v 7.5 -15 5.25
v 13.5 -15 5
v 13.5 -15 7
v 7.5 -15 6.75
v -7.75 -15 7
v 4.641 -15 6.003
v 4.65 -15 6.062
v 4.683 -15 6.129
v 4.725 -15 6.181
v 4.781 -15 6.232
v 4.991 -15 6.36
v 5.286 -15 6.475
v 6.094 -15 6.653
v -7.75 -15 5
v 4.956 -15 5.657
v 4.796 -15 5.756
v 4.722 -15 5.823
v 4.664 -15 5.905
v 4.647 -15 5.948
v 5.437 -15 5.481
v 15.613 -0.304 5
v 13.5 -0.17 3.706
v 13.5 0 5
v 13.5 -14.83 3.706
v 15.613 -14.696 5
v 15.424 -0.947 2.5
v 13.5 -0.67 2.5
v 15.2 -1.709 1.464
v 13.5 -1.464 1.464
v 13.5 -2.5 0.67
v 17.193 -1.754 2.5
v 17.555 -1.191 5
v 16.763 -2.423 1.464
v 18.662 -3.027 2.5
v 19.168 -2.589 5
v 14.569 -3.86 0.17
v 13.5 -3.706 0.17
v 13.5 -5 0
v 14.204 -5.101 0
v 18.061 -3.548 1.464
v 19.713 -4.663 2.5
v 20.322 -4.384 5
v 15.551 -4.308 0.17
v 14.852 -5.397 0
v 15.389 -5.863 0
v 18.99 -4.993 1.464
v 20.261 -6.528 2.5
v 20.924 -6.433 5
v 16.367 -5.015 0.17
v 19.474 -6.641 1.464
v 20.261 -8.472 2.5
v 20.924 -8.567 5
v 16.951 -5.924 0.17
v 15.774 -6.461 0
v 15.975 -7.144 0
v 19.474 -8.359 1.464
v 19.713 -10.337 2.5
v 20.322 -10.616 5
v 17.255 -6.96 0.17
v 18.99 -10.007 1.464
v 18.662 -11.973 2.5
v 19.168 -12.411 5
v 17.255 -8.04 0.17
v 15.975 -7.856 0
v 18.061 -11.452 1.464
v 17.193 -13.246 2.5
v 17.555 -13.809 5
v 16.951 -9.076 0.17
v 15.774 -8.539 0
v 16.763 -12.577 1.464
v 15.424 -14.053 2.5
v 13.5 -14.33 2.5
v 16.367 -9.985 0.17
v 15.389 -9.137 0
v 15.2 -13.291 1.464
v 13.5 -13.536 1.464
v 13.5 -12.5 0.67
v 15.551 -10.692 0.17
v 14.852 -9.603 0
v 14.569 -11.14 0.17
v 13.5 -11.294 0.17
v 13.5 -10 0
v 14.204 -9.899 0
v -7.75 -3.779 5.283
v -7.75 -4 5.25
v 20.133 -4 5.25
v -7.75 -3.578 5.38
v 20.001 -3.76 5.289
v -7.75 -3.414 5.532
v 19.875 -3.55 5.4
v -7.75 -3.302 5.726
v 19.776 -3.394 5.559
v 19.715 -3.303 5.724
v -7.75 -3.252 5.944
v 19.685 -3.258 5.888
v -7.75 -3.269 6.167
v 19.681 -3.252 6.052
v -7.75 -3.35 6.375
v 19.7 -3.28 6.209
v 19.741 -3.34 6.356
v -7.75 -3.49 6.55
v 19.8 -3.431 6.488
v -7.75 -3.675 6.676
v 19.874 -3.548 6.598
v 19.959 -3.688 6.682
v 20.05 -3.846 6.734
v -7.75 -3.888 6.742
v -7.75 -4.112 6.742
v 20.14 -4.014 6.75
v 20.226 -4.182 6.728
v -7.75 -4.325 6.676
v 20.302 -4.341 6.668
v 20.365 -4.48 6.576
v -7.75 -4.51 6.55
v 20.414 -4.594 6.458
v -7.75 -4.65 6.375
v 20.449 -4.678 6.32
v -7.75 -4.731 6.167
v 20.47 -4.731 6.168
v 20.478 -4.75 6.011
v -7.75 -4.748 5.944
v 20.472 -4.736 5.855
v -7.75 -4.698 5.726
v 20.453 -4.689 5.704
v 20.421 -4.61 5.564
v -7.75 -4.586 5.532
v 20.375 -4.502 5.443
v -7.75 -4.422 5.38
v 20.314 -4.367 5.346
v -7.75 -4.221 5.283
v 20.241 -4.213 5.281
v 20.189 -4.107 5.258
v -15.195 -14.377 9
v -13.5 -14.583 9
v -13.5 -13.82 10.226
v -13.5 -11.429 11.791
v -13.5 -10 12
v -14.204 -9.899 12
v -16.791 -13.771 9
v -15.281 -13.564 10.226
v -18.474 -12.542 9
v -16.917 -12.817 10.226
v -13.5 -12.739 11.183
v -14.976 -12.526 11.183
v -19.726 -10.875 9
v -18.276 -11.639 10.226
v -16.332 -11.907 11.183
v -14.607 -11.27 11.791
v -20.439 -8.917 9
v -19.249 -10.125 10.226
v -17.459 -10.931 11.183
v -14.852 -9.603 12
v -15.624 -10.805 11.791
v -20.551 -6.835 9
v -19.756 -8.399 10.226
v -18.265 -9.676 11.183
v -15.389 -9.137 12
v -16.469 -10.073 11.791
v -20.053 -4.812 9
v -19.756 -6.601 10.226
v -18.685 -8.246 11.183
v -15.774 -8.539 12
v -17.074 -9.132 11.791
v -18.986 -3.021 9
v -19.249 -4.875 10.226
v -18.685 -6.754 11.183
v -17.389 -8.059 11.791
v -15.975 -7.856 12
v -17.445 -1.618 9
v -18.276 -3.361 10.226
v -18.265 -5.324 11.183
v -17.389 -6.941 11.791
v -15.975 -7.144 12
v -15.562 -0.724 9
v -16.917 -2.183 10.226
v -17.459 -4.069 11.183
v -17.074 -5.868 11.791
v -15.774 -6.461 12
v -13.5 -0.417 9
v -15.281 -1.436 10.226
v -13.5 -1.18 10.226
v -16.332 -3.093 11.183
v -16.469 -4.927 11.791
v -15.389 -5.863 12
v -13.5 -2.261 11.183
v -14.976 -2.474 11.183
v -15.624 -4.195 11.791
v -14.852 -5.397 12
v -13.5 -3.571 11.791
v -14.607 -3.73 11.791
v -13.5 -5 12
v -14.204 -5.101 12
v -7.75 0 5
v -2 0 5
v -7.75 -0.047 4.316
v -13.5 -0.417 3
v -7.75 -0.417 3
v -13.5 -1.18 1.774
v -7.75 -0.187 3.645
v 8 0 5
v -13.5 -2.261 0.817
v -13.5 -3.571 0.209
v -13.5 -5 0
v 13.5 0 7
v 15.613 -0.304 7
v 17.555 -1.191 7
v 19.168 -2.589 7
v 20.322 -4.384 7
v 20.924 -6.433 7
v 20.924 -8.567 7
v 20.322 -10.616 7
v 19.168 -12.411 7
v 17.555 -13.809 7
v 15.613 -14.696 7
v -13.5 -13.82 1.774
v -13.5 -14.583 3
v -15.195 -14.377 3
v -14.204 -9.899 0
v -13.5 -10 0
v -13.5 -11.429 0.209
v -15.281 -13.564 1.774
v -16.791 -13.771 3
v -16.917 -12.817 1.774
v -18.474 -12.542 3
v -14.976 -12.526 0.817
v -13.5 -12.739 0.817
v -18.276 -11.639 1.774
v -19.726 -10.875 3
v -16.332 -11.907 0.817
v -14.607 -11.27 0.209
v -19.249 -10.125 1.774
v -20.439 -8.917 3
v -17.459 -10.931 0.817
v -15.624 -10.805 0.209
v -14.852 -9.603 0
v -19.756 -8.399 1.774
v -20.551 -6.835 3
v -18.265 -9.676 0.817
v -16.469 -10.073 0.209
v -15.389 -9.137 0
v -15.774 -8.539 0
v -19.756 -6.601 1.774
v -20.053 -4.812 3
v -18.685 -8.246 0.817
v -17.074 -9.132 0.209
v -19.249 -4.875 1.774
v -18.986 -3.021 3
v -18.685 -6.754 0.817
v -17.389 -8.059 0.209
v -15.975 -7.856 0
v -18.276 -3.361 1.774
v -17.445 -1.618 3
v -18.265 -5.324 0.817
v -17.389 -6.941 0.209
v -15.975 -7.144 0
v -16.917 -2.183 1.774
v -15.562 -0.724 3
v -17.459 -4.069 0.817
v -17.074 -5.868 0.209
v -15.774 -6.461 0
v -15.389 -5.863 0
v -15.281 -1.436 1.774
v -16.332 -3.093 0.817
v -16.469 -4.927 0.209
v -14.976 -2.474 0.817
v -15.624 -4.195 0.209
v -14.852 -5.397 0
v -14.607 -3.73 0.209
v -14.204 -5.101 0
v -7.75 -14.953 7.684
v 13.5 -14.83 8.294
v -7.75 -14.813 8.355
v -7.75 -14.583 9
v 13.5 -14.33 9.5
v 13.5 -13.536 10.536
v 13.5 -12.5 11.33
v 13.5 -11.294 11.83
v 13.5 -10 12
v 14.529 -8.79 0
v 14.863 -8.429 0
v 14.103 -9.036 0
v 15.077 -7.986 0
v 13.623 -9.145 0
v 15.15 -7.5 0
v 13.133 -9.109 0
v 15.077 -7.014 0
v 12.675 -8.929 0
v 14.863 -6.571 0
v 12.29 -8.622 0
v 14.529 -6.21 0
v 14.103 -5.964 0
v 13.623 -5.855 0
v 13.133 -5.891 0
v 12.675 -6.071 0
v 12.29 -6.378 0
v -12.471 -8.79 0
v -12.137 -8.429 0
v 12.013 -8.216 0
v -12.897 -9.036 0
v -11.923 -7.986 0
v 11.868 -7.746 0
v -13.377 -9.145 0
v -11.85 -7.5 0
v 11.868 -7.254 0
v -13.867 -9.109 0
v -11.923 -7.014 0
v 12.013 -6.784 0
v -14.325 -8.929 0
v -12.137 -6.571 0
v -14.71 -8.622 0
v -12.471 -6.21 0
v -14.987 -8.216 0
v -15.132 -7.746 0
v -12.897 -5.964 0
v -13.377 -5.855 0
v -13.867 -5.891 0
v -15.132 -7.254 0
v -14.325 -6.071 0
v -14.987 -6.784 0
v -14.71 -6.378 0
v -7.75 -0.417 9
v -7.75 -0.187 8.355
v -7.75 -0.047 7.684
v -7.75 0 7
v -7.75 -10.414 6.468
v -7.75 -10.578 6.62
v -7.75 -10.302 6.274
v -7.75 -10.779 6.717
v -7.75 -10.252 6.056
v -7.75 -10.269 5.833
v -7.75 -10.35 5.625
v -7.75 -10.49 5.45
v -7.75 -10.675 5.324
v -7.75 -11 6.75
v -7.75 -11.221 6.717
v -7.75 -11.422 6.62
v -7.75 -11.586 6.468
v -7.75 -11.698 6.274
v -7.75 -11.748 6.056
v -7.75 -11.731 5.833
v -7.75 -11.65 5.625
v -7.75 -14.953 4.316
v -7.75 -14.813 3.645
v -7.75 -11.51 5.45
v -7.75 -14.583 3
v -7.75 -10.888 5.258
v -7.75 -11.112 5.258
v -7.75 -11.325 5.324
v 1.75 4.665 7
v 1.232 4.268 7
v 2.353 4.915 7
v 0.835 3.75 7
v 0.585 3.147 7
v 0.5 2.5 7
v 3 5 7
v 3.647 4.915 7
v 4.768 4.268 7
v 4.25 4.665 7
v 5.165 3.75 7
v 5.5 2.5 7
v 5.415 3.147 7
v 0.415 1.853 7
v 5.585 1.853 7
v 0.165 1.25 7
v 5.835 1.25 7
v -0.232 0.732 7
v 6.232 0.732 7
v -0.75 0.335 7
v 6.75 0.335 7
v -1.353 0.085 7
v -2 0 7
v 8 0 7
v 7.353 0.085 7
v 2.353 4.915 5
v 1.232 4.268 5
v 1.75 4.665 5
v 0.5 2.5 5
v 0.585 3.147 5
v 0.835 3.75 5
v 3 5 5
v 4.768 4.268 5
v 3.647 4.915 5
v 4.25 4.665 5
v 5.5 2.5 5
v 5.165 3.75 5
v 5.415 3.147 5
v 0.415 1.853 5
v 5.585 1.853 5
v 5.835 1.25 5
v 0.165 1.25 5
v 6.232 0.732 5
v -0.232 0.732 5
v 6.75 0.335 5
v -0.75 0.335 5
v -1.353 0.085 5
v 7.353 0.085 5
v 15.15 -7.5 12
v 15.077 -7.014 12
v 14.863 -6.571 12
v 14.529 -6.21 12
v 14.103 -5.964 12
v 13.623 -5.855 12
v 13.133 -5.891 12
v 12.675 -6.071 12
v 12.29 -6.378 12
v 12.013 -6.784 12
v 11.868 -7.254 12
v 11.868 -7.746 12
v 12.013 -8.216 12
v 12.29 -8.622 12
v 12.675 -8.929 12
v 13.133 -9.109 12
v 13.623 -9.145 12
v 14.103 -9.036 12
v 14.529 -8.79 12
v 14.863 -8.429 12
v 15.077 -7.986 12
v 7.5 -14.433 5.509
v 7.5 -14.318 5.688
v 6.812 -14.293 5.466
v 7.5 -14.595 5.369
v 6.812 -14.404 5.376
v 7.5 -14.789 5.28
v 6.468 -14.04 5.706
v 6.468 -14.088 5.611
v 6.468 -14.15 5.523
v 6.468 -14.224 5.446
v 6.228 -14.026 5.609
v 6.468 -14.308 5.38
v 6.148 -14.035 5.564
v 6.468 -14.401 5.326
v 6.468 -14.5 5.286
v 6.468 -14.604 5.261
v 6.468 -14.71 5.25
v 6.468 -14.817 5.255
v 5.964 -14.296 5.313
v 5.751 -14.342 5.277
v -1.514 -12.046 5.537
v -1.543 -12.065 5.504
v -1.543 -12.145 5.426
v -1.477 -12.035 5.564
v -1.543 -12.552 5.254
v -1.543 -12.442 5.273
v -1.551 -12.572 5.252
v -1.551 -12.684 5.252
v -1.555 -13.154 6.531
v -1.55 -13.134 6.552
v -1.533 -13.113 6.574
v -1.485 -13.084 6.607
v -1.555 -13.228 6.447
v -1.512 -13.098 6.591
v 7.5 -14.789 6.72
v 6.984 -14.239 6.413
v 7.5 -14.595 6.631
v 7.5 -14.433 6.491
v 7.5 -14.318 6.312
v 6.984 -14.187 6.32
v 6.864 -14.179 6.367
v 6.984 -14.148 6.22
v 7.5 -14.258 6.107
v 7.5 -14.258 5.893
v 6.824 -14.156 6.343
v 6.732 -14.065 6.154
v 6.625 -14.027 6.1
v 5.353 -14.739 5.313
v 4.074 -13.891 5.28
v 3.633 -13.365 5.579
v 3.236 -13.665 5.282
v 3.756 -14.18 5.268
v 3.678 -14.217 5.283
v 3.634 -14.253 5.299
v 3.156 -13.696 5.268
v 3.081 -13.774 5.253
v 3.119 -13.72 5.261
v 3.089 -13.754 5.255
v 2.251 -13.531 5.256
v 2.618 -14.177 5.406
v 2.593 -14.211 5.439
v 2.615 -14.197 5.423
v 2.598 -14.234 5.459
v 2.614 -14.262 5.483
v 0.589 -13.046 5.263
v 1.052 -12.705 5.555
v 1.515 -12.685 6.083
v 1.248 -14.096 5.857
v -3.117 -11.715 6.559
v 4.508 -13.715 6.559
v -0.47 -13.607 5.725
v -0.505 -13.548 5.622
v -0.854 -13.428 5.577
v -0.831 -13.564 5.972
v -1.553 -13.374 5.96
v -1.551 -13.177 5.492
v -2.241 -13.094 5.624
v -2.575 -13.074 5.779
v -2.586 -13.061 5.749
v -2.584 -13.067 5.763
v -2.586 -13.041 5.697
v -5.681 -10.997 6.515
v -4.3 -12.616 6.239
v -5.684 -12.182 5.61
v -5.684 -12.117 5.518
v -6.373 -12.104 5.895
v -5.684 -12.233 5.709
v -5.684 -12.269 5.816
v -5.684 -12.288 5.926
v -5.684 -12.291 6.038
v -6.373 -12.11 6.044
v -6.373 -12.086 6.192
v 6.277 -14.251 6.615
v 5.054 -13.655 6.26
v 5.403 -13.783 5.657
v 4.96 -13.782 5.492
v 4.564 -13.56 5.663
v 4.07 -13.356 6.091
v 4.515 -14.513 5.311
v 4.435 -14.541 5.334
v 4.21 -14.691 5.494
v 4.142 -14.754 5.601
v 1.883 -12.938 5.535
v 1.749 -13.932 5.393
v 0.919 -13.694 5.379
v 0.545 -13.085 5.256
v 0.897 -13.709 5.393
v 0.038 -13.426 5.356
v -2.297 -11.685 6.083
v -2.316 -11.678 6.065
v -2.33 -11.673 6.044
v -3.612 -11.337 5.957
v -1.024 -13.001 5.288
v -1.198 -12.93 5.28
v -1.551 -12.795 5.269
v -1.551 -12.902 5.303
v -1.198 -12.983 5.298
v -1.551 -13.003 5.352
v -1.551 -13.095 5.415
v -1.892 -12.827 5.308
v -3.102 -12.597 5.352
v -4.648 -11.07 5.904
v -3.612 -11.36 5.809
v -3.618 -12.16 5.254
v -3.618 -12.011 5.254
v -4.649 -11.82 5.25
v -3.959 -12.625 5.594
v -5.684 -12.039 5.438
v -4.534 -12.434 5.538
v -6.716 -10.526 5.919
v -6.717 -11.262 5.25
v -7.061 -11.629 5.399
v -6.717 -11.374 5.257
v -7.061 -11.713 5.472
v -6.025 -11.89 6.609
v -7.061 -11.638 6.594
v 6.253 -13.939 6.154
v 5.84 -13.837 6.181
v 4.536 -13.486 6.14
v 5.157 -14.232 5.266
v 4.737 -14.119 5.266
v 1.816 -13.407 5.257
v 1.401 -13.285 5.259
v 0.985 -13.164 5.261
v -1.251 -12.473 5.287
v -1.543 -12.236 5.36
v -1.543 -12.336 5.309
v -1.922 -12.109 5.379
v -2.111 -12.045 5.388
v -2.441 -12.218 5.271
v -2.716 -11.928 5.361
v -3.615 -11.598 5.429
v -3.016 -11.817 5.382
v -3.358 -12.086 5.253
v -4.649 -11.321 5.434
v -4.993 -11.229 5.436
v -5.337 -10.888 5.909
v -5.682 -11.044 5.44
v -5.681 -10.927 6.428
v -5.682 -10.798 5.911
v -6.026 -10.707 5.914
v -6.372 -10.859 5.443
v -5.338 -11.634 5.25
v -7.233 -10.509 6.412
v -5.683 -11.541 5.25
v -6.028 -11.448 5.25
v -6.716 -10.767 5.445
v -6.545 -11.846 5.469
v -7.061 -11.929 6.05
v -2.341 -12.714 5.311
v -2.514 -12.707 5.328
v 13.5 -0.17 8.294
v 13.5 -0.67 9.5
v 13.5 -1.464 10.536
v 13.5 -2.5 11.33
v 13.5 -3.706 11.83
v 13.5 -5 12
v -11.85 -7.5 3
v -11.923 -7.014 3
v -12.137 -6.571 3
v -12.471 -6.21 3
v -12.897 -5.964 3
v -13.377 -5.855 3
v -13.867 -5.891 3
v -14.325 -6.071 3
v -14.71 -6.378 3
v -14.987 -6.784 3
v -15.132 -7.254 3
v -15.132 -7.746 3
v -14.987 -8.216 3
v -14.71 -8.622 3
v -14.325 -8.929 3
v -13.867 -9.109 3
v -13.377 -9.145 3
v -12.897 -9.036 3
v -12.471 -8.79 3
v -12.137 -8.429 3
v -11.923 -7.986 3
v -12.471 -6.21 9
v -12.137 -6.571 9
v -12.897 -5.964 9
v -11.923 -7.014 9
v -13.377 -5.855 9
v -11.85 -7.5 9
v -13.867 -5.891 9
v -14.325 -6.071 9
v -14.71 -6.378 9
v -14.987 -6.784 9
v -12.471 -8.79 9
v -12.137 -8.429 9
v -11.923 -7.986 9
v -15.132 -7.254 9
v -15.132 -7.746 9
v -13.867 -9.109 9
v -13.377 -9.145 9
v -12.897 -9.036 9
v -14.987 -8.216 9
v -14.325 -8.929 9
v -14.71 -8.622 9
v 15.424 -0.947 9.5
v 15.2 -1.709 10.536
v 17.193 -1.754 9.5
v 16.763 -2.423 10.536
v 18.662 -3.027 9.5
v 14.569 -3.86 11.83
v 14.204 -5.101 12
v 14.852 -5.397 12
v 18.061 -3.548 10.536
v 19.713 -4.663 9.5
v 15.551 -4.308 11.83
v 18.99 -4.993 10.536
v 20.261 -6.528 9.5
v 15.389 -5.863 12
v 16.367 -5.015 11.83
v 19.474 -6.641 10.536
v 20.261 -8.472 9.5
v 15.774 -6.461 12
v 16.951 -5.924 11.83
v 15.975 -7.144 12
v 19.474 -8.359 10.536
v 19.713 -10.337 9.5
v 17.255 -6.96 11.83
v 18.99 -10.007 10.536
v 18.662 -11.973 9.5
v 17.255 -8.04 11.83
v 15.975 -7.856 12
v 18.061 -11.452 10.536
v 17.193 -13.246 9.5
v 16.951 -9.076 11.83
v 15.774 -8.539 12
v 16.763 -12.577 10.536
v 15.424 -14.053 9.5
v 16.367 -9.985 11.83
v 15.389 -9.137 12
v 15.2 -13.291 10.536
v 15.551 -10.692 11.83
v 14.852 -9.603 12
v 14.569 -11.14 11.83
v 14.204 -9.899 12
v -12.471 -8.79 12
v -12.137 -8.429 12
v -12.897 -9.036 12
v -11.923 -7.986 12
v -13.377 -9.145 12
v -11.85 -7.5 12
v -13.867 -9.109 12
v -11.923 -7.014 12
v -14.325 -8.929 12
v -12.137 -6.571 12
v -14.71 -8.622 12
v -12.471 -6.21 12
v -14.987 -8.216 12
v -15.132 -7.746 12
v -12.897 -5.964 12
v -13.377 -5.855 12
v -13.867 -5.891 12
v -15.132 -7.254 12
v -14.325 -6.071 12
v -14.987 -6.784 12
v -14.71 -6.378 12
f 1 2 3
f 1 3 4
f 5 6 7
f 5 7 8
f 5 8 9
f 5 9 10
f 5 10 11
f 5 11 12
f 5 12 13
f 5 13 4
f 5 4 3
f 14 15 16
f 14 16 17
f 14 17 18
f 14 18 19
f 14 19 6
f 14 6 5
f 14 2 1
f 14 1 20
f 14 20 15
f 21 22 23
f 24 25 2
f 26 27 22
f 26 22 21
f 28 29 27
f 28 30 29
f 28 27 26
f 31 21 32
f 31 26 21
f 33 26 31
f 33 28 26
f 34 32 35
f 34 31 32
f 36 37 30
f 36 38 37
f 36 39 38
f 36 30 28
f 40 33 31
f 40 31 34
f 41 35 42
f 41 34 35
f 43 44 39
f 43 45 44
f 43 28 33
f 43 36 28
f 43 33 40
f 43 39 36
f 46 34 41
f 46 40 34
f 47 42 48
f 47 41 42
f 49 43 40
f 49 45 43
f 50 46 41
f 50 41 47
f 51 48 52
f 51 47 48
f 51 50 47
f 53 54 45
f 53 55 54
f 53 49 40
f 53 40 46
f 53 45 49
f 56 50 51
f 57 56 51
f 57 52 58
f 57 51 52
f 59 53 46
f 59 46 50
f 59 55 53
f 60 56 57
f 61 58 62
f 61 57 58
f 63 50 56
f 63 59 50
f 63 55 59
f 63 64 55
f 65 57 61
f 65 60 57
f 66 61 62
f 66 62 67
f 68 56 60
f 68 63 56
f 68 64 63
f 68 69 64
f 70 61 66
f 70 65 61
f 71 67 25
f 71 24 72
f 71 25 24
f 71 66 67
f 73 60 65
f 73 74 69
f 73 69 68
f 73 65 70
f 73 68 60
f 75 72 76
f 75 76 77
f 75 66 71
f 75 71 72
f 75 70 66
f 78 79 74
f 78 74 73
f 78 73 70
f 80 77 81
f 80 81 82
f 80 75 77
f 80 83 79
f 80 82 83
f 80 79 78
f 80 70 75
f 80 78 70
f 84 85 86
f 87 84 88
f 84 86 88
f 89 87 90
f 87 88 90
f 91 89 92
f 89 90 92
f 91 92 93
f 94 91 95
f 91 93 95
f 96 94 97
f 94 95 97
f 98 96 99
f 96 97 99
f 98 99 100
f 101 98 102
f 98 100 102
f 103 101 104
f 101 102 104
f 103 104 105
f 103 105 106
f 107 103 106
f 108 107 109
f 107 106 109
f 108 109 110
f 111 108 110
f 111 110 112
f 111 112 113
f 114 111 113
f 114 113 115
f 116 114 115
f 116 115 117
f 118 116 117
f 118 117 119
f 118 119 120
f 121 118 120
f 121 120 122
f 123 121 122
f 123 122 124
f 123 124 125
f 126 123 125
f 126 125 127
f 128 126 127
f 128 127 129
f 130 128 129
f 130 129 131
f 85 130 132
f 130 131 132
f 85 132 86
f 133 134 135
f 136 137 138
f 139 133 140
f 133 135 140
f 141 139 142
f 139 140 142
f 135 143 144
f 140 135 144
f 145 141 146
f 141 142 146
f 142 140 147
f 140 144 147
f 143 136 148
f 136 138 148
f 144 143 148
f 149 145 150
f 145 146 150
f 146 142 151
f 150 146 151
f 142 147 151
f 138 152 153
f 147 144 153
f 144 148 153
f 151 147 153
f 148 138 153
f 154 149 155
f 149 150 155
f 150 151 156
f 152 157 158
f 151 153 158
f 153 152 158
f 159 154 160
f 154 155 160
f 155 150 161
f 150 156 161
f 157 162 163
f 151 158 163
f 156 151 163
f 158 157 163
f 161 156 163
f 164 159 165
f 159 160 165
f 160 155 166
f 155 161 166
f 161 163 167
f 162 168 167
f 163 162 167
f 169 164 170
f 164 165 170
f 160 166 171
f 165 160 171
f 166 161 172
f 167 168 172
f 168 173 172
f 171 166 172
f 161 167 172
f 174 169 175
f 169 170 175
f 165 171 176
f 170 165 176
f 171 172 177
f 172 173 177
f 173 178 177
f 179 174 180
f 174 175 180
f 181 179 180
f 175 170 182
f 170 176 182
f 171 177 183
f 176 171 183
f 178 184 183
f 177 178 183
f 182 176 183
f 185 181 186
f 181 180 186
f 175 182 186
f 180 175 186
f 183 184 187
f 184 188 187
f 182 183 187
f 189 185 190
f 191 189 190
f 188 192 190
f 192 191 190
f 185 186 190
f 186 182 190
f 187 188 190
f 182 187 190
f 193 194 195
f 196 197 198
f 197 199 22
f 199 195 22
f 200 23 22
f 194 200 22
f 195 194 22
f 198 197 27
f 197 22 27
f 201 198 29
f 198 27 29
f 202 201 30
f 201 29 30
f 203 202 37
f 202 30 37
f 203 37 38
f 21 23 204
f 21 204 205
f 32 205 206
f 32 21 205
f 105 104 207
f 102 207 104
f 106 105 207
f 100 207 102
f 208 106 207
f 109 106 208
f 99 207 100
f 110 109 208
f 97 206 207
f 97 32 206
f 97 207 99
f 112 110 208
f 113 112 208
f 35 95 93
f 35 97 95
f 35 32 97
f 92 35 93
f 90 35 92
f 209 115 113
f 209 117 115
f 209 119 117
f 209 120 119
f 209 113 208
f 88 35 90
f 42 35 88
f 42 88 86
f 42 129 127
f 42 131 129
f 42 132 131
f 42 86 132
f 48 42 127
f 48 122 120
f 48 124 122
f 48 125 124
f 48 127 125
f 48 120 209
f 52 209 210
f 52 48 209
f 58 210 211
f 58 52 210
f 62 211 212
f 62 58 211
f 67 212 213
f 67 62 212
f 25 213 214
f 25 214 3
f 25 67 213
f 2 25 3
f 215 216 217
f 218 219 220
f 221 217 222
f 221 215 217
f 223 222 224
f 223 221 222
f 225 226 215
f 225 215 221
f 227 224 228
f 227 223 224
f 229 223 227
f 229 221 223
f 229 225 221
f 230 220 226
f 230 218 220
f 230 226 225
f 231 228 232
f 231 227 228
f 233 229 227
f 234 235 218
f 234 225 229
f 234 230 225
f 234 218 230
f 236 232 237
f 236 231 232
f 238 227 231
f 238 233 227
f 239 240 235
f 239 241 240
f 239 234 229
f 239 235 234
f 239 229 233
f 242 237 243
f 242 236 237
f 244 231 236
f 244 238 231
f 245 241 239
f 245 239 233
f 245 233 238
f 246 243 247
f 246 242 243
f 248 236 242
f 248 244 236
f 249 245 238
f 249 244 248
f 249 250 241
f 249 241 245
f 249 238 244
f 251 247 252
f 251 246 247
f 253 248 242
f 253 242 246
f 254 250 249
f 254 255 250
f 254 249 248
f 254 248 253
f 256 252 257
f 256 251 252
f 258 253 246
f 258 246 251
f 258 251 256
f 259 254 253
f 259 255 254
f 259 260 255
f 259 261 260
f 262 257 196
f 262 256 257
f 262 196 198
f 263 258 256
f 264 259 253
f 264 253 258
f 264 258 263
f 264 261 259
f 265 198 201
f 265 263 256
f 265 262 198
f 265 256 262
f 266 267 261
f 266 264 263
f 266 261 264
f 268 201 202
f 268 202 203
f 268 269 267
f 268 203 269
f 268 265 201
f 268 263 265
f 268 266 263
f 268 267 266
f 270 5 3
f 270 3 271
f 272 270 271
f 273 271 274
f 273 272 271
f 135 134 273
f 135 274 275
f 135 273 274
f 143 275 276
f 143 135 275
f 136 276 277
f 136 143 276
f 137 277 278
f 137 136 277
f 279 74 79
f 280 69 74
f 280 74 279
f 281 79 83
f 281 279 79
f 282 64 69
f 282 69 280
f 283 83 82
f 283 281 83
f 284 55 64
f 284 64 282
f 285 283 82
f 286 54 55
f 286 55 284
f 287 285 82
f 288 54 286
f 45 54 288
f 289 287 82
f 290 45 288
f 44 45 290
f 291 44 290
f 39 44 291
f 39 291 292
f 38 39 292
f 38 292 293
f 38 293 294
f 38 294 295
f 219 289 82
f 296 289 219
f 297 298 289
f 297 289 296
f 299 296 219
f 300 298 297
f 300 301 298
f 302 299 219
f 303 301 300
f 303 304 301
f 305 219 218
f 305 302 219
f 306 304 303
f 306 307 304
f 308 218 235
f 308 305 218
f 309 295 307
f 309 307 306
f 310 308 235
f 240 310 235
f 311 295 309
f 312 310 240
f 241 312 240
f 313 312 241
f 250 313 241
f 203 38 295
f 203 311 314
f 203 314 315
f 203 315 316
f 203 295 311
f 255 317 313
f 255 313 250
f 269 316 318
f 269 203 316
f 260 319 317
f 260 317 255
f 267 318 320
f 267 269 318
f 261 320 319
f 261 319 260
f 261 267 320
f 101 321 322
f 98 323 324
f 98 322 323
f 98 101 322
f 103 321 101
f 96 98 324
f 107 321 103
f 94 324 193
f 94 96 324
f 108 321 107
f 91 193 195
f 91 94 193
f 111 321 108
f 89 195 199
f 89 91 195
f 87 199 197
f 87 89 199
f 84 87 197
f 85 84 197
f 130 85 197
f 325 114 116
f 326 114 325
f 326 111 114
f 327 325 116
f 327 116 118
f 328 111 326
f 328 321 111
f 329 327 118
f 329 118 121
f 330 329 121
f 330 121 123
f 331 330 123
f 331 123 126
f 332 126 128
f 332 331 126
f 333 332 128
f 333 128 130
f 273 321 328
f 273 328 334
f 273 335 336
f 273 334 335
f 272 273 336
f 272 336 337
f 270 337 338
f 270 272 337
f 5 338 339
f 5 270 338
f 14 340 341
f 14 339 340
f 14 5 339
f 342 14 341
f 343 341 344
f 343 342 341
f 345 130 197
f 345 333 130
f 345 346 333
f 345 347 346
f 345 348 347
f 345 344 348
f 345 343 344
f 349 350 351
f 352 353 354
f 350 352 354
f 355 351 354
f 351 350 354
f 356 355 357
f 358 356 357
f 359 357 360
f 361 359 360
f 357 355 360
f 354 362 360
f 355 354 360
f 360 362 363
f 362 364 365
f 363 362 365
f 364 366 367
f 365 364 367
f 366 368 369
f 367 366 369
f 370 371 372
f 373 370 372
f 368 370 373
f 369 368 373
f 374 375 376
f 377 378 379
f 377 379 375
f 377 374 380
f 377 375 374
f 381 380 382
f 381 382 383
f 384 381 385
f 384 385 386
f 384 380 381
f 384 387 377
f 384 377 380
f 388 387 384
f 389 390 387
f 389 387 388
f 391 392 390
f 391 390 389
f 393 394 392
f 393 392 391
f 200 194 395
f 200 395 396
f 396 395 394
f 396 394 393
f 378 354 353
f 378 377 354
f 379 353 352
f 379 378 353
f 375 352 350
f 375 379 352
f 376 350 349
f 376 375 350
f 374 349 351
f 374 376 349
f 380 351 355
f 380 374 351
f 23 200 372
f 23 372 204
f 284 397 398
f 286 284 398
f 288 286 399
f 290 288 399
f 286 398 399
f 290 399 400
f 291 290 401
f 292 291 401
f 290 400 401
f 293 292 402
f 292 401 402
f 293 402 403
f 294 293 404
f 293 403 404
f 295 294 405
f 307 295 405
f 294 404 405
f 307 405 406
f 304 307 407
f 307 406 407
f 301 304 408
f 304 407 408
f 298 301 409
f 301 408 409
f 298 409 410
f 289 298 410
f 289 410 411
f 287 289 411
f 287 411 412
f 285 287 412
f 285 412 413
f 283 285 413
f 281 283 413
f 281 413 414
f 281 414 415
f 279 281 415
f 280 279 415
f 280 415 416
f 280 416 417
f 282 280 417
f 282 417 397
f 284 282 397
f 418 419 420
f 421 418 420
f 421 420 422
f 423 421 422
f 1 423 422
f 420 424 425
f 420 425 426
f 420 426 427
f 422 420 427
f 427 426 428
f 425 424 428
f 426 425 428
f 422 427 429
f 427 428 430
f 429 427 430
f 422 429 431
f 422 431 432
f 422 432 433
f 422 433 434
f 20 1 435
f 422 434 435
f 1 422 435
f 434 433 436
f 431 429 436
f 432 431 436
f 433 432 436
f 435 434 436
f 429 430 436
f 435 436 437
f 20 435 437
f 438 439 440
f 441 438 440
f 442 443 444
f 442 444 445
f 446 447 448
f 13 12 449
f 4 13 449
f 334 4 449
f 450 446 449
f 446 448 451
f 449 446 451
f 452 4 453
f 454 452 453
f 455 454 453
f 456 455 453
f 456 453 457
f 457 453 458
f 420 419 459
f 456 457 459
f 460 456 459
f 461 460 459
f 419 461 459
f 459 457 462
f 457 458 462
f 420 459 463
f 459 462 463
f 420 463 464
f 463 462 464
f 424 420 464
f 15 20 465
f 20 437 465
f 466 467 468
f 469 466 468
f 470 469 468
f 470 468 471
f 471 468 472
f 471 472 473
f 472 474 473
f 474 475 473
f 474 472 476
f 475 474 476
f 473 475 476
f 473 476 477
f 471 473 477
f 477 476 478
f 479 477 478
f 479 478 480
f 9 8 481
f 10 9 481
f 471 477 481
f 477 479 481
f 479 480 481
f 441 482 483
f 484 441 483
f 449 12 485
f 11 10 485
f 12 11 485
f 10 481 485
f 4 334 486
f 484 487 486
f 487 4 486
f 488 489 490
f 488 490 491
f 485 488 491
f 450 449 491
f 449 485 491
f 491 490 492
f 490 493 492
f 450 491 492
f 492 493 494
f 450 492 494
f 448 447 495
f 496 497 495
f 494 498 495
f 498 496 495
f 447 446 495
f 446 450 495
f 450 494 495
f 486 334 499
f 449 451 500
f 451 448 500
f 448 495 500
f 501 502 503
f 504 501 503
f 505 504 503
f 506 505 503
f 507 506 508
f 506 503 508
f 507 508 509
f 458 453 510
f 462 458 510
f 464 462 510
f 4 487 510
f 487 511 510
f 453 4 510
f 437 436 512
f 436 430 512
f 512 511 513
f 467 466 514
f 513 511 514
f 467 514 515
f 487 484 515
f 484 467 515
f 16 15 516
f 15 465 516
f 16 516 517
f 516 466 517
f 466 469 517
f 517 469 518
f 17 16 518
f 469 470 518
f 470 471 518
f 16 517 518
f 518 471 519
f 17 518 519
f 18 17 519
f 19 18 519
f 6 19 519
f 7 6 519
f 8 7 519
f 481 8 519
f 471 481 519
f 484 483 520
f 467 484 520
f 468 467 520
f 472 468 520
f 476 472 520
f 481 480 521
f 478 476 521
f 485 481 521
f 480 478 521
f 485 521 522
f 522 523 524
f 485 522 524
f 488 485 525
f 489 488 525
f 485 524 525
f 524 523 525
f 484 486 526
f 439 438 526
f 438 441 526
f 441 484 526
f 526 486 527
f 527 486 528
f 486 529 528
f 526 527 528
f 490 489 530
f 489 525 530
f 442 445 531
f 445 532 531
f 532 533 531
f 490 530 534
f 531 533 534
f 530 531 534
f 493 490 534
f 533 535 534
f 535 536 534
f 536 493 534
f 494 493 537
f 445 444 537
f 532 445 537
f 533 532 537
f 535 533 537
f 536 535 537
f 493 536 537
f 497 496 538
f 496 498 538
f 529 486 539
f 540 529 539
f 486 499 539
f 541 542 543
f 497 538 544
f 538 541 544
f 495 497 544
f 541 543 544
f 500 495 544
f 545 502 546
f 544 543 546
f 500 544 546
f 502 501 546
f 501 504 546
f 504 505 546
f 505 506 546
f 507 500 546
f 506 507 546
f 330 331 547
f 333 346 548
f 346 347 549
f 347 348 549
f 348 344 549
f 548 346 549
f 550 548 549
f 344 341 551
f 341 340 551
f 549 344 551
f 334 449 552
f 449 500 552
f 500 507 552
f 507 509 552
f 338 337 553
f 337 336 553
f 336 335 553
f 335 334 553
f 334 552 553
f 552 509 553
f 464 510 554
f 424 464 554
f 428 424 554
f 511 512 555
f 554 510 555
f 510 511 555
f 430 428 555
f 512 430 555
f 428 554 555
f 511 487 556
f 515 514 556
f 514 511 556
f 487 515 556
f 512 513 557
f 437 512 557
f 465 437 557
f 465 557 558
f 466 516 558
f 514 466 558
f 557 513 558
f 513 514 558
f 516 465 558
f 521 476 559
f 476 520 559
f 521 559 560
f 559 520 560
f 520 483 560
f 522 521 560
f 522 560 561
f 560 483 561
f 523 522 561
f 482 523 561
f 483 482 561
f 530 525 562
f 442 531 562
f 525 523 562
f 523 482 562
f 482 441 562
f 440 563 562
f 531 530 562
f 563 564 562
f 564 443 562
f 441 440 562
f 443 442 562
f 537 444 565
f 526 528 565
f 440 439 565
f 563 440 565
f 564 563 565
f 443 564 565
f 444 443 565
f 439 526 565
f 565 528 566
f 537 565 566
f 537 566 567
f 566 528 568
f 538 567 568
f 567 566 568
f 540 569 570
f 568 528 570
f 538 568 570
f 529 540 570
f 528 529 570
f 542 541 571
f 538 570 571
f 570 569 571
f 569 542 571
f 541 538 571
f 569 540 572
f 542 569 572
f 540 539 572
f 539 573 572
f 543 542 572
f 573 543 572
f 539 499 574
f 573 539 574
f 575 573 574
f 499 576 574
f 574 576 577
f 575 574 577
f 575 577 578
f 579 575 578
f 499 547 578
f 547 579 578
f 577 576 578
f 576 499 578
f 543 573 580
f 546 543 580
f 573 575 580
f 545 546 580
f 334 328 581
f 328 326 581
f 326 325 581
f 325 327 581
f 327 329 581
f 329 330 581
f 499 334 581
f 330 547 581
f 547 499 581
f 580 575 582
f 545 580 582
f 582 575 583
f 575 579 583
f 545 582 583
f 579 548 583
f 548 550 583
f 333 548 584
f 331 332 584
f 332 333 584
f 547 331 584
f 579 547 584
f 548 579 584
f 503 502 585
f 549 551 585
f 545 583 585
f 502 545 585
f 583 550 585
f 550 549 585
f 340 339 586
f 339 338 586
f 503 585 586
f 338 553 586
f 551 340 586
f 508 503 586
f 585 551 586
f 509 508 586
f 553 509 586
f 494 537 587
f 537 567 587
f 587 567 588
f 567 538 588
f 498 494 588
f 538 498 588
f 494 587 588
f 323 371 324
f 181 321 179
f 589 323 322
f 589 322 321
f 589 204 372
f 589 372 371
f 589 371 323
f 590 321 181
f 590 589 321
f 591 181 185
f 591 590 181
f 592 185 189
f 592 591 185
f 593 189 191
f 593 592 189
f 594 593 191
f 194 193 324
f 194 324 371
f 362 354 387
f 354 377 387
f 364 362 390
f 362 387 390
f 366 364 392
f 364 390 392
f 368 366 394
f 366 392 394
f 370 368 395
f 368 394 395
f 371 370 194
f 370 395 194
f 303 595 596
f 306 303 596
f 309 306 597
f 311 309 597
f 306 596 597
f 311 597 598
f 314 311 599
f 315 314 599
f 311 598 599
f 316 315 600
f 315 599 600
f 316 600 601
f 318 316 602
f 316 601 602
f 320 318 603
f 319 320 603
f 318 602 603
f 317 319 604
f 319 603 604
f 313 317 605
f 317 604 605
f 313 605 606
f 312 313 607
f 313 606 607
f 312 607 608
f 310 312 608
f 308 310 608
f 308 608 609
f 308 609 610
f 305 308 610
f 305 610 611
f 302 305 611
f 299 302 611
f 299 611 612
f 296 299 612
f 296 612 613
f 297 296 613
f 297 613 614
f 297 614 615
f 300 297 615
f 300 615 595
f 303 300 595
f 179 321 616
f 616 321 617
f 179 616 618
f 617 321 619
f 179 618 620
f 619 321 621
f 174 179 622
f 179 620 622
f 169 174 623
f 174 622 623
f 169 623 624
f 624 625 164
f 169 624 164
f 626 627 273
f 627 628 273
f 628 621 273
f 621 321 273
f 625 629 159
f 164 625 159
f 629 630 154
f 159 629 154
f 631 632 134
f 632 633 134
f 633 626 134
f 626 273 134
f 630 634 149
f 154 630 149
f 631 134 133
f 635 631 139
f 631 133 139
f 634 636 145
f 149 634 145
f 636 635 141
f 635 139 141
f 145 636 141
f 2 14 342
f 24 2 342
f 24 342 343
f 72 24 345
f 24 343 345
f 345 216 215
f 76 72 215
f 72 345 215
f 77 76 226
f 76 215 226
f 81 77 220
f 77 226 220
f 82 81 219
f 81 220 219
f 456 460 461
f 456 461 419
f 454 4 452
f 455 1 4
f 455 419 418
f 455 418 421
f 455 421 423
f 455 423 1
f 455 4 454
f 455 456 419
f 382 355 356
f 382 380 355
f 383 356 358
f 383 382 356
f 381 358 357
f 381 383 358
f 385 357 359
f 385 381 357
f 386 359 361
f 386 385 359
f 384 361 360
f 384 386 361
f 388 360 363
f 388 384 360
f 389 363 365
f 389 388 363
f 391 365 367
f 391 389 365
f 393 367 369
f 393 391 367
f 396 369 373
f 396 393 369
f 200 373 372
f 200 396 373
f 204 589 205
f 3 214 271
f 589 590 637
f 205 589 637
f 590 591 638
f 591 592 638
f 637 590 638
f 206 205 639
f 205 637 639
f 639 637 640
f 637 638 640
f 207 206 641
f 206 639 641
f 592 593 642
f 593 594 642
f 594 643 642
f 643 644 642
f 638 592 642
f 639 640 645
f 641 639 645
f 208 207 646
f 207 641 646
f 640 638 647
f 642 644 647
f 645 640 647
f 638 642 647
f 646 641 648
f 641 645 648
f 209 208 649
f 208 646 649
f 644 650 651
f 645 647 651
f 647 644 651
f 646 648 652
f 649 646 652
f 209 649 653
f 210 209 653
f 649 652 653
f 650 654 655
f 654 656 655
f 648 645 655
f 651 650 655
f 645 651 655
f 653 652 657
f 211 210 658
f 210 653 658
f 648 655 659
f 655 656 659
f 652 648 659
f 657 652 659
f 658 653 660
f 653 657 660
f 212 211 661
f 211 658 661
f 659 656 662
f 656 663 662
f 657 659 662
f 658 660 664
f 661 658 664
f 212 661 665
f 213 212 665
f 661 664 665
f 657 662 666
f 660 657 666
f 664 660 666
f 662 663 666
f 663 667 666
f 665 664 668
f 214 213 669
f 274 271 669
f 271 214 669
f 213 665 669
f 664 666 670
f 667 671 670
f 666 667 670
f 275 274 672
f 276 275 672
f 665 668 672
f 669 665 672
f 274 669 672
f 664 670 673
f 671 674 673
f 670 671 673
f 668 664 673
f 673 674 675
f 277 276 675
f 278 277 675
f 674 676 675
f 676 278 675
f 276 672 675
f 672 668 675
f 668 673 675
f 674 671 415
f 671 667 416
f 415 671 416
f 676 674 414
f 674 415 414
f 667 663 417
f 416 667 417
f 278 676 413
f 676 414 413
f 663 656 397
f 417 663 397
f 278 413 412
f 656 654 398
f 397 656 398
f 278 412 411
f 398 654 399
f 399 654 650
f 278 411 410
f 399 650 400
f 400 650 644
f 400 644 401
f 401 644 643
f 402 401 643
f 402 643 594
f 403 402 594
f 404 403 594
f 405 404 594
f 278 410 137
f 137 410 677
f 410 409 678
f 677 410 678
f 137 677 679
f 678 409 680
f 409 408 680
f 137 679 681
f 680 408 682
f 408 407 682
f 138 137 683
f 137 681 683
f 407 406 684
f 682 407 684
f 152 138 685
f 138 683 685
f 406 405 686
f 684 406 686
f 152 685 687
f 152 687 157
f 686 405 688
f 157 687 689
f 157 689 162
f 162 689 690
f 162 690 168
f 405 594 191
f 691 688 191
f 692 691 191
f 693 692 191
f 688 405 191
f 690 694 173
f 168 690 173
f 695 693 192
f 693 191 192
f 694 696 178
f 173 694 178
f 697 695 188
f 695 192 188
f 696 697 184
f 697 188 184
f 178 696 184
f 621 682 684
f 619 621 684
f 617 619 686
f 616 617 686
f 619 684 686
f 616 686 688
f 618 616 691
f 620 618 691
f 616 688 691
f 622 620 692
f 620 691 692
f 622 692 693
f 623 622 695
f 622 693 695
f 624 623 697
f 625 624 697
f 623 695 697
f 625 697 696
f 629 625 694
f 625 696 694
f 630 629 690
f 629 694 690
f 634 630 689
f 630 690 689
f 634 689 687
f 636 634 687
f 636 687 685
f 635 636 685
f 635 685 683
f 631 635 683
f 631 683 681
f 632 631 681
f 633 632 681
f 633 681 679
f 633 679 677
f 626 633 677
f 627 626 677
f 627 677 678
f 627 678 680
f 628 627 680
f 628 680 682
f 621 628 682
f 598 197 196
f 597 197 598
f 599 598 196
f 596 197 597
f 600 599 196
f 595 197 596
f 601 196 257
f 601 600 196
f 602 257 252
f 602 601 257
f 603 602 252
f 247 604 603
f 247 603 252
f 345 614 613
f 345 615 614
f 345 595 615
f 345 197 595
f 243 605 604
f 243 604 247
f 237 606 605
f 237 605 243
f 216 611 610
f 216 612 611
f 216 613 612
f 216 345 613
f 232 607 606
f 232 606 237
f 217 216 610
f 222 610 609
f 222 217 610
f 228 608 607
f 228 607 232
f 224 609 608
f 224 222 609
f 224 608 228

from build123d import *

# Parameters (mm, degrees)
BOSS_EXTRUDE1_DEPTH = 12
FILLET1_R           = 5
SKETCH5_W           = 13.25
SKETCH5_H           = 6
CUT_EXTRUDE3_DEPTH  = 35.785054262
SKETCH6_W           = 5
SKETCH6_H           = 2
BOSS_EXTRUDE2_DEPTH = 5
FILLET2_R           = 2.5
FILLET3_R           = 2.5
SKETCH3_R           = 1.65
CUT_EXTRUDE4_DEPTH  = 29.460498984
SKETCH8_R           = 0.75
CUT_EXTRUDE7_DEPTH  = 46.805137399
SKETCH9_R           = 0.75
CUT_EXTRUDE9_DEPTH  = 15.765865025


with BuildPart() as part:
    # Sketch2 → Boss-Extrude1 (new body)
    with BuildSketch(Plane.XY):
        with BuildLine():
            Line((-13.5, 0), (13.5, 0))
            ThreePointArc((13.5, 0), (21, -7.5), (13.5, -15))
            Line((13.5, -15), (-13.5, -15))
            ThreePointArc((-13.5, -15), (-21, -7.5), (-13.5, 0))
        make_face()
    extrude(amount=BOSS_EXTRUDE1_DEPTH)

    # Fillet1
    fillet1_edges = [part.edges().sort_by_distance(p)[0] for p in [
        (-21, -7.5, 12),
        (0, -15, 12),
        (21, -7.5, 12),
        (0, -15, 0),
        (-21, -7.5, 0),
        (0, 0, 0),
        (21, -7.5, 0),
        (0, 0, 12),
    ]]
    fillet(fillet1_edges, radius=FILLET1_R)

    # Sketch5 → Cut-Extrude3 (cut, through all)
    with BuildSketch(Plane(origin=(0, -25, 0), x_dir=(-1, 0, 0), z_dir=(0, -1, 0))):
        with Locations((14.375, -6)):
            Rectangle(SKETCH5_W, SKETCH5_H)
    extrude(amount=-CUT_EXTRUDE3_DEPTH, mode=Mode.SUBTRACT)

    # Sketch6 → Boss-Extrude2 (add)
    with BuildSketch(Plane(origin=(0, 0, 0), x_dir=(1, 0, 0), z_dir=(0, 1, 0))):
        with Locations((3, -6)):
            Rectangle(SKETCH6_W, SKETCH6_H)
    extrude(amount=BOSS_EXTRUDE2_DEPTH)

    # Fillet2
    fillet2_edges = [part.edges().sort_by_distance(p)[0] for p in [
        (5.5, 5, 6),
        (0.5, 5, 6),
    ]]
    fillet(fillet2_edges, radius=FILLET2_R - 0.0001)  # a hair under: the kernel refuses the full size

    # Fillet3
    fillet3_edges = [part.edges().sort_by_distance(p)[0] for p in [
        (0.5, 0, 6),
        (5.5, 0, 6),
    ]]
    fillet(fillet3_edges, radius=FILLET3_R)

    # Sketch3 → Cut-Extrude4 (cut, through all)
    with BuildSketch(Plane.XY.offset(12)):
        with Locations((-13.5, -7.5)):
            Circle(SKETCH3_R)
        with Locations((13.5, -7.5)):
            Circle(SKETCH3_R)
    extrude(amount=-CUT_EXTRUDE4_DEPTH, mode=Mode.SUBTRACT)

    # Sketch8 → Cut-Extrude7 (cut, through all)
    with BuildSketch(Plane(origin=(21, 0, 0), x_dir=(0, 0, -1), z_dir=(1, 0, 0))):
        with Locations((-6, -4)):
            Circle(SKETCH8_R)
    extrude(amount=-CUT_EXTRUDE7_DEPTH, mode=Mode.SUBTRACT)

    # Sketch9 → Cut-Extrude9 (cut, along a direction that is not the sketch's normal)
    with BuildSketch(Plane.ZY.offset(7.75)):
        with Locations((6, -11)):
            Circle(SKETCH9_R)
    extrude(amount=-CUT_EXTRUDE9_DEPTH, dir=(-0.9672796243913314, 0.25371268836493915, 0), mode=Mode.SUBTRACT)


solid = part.part
